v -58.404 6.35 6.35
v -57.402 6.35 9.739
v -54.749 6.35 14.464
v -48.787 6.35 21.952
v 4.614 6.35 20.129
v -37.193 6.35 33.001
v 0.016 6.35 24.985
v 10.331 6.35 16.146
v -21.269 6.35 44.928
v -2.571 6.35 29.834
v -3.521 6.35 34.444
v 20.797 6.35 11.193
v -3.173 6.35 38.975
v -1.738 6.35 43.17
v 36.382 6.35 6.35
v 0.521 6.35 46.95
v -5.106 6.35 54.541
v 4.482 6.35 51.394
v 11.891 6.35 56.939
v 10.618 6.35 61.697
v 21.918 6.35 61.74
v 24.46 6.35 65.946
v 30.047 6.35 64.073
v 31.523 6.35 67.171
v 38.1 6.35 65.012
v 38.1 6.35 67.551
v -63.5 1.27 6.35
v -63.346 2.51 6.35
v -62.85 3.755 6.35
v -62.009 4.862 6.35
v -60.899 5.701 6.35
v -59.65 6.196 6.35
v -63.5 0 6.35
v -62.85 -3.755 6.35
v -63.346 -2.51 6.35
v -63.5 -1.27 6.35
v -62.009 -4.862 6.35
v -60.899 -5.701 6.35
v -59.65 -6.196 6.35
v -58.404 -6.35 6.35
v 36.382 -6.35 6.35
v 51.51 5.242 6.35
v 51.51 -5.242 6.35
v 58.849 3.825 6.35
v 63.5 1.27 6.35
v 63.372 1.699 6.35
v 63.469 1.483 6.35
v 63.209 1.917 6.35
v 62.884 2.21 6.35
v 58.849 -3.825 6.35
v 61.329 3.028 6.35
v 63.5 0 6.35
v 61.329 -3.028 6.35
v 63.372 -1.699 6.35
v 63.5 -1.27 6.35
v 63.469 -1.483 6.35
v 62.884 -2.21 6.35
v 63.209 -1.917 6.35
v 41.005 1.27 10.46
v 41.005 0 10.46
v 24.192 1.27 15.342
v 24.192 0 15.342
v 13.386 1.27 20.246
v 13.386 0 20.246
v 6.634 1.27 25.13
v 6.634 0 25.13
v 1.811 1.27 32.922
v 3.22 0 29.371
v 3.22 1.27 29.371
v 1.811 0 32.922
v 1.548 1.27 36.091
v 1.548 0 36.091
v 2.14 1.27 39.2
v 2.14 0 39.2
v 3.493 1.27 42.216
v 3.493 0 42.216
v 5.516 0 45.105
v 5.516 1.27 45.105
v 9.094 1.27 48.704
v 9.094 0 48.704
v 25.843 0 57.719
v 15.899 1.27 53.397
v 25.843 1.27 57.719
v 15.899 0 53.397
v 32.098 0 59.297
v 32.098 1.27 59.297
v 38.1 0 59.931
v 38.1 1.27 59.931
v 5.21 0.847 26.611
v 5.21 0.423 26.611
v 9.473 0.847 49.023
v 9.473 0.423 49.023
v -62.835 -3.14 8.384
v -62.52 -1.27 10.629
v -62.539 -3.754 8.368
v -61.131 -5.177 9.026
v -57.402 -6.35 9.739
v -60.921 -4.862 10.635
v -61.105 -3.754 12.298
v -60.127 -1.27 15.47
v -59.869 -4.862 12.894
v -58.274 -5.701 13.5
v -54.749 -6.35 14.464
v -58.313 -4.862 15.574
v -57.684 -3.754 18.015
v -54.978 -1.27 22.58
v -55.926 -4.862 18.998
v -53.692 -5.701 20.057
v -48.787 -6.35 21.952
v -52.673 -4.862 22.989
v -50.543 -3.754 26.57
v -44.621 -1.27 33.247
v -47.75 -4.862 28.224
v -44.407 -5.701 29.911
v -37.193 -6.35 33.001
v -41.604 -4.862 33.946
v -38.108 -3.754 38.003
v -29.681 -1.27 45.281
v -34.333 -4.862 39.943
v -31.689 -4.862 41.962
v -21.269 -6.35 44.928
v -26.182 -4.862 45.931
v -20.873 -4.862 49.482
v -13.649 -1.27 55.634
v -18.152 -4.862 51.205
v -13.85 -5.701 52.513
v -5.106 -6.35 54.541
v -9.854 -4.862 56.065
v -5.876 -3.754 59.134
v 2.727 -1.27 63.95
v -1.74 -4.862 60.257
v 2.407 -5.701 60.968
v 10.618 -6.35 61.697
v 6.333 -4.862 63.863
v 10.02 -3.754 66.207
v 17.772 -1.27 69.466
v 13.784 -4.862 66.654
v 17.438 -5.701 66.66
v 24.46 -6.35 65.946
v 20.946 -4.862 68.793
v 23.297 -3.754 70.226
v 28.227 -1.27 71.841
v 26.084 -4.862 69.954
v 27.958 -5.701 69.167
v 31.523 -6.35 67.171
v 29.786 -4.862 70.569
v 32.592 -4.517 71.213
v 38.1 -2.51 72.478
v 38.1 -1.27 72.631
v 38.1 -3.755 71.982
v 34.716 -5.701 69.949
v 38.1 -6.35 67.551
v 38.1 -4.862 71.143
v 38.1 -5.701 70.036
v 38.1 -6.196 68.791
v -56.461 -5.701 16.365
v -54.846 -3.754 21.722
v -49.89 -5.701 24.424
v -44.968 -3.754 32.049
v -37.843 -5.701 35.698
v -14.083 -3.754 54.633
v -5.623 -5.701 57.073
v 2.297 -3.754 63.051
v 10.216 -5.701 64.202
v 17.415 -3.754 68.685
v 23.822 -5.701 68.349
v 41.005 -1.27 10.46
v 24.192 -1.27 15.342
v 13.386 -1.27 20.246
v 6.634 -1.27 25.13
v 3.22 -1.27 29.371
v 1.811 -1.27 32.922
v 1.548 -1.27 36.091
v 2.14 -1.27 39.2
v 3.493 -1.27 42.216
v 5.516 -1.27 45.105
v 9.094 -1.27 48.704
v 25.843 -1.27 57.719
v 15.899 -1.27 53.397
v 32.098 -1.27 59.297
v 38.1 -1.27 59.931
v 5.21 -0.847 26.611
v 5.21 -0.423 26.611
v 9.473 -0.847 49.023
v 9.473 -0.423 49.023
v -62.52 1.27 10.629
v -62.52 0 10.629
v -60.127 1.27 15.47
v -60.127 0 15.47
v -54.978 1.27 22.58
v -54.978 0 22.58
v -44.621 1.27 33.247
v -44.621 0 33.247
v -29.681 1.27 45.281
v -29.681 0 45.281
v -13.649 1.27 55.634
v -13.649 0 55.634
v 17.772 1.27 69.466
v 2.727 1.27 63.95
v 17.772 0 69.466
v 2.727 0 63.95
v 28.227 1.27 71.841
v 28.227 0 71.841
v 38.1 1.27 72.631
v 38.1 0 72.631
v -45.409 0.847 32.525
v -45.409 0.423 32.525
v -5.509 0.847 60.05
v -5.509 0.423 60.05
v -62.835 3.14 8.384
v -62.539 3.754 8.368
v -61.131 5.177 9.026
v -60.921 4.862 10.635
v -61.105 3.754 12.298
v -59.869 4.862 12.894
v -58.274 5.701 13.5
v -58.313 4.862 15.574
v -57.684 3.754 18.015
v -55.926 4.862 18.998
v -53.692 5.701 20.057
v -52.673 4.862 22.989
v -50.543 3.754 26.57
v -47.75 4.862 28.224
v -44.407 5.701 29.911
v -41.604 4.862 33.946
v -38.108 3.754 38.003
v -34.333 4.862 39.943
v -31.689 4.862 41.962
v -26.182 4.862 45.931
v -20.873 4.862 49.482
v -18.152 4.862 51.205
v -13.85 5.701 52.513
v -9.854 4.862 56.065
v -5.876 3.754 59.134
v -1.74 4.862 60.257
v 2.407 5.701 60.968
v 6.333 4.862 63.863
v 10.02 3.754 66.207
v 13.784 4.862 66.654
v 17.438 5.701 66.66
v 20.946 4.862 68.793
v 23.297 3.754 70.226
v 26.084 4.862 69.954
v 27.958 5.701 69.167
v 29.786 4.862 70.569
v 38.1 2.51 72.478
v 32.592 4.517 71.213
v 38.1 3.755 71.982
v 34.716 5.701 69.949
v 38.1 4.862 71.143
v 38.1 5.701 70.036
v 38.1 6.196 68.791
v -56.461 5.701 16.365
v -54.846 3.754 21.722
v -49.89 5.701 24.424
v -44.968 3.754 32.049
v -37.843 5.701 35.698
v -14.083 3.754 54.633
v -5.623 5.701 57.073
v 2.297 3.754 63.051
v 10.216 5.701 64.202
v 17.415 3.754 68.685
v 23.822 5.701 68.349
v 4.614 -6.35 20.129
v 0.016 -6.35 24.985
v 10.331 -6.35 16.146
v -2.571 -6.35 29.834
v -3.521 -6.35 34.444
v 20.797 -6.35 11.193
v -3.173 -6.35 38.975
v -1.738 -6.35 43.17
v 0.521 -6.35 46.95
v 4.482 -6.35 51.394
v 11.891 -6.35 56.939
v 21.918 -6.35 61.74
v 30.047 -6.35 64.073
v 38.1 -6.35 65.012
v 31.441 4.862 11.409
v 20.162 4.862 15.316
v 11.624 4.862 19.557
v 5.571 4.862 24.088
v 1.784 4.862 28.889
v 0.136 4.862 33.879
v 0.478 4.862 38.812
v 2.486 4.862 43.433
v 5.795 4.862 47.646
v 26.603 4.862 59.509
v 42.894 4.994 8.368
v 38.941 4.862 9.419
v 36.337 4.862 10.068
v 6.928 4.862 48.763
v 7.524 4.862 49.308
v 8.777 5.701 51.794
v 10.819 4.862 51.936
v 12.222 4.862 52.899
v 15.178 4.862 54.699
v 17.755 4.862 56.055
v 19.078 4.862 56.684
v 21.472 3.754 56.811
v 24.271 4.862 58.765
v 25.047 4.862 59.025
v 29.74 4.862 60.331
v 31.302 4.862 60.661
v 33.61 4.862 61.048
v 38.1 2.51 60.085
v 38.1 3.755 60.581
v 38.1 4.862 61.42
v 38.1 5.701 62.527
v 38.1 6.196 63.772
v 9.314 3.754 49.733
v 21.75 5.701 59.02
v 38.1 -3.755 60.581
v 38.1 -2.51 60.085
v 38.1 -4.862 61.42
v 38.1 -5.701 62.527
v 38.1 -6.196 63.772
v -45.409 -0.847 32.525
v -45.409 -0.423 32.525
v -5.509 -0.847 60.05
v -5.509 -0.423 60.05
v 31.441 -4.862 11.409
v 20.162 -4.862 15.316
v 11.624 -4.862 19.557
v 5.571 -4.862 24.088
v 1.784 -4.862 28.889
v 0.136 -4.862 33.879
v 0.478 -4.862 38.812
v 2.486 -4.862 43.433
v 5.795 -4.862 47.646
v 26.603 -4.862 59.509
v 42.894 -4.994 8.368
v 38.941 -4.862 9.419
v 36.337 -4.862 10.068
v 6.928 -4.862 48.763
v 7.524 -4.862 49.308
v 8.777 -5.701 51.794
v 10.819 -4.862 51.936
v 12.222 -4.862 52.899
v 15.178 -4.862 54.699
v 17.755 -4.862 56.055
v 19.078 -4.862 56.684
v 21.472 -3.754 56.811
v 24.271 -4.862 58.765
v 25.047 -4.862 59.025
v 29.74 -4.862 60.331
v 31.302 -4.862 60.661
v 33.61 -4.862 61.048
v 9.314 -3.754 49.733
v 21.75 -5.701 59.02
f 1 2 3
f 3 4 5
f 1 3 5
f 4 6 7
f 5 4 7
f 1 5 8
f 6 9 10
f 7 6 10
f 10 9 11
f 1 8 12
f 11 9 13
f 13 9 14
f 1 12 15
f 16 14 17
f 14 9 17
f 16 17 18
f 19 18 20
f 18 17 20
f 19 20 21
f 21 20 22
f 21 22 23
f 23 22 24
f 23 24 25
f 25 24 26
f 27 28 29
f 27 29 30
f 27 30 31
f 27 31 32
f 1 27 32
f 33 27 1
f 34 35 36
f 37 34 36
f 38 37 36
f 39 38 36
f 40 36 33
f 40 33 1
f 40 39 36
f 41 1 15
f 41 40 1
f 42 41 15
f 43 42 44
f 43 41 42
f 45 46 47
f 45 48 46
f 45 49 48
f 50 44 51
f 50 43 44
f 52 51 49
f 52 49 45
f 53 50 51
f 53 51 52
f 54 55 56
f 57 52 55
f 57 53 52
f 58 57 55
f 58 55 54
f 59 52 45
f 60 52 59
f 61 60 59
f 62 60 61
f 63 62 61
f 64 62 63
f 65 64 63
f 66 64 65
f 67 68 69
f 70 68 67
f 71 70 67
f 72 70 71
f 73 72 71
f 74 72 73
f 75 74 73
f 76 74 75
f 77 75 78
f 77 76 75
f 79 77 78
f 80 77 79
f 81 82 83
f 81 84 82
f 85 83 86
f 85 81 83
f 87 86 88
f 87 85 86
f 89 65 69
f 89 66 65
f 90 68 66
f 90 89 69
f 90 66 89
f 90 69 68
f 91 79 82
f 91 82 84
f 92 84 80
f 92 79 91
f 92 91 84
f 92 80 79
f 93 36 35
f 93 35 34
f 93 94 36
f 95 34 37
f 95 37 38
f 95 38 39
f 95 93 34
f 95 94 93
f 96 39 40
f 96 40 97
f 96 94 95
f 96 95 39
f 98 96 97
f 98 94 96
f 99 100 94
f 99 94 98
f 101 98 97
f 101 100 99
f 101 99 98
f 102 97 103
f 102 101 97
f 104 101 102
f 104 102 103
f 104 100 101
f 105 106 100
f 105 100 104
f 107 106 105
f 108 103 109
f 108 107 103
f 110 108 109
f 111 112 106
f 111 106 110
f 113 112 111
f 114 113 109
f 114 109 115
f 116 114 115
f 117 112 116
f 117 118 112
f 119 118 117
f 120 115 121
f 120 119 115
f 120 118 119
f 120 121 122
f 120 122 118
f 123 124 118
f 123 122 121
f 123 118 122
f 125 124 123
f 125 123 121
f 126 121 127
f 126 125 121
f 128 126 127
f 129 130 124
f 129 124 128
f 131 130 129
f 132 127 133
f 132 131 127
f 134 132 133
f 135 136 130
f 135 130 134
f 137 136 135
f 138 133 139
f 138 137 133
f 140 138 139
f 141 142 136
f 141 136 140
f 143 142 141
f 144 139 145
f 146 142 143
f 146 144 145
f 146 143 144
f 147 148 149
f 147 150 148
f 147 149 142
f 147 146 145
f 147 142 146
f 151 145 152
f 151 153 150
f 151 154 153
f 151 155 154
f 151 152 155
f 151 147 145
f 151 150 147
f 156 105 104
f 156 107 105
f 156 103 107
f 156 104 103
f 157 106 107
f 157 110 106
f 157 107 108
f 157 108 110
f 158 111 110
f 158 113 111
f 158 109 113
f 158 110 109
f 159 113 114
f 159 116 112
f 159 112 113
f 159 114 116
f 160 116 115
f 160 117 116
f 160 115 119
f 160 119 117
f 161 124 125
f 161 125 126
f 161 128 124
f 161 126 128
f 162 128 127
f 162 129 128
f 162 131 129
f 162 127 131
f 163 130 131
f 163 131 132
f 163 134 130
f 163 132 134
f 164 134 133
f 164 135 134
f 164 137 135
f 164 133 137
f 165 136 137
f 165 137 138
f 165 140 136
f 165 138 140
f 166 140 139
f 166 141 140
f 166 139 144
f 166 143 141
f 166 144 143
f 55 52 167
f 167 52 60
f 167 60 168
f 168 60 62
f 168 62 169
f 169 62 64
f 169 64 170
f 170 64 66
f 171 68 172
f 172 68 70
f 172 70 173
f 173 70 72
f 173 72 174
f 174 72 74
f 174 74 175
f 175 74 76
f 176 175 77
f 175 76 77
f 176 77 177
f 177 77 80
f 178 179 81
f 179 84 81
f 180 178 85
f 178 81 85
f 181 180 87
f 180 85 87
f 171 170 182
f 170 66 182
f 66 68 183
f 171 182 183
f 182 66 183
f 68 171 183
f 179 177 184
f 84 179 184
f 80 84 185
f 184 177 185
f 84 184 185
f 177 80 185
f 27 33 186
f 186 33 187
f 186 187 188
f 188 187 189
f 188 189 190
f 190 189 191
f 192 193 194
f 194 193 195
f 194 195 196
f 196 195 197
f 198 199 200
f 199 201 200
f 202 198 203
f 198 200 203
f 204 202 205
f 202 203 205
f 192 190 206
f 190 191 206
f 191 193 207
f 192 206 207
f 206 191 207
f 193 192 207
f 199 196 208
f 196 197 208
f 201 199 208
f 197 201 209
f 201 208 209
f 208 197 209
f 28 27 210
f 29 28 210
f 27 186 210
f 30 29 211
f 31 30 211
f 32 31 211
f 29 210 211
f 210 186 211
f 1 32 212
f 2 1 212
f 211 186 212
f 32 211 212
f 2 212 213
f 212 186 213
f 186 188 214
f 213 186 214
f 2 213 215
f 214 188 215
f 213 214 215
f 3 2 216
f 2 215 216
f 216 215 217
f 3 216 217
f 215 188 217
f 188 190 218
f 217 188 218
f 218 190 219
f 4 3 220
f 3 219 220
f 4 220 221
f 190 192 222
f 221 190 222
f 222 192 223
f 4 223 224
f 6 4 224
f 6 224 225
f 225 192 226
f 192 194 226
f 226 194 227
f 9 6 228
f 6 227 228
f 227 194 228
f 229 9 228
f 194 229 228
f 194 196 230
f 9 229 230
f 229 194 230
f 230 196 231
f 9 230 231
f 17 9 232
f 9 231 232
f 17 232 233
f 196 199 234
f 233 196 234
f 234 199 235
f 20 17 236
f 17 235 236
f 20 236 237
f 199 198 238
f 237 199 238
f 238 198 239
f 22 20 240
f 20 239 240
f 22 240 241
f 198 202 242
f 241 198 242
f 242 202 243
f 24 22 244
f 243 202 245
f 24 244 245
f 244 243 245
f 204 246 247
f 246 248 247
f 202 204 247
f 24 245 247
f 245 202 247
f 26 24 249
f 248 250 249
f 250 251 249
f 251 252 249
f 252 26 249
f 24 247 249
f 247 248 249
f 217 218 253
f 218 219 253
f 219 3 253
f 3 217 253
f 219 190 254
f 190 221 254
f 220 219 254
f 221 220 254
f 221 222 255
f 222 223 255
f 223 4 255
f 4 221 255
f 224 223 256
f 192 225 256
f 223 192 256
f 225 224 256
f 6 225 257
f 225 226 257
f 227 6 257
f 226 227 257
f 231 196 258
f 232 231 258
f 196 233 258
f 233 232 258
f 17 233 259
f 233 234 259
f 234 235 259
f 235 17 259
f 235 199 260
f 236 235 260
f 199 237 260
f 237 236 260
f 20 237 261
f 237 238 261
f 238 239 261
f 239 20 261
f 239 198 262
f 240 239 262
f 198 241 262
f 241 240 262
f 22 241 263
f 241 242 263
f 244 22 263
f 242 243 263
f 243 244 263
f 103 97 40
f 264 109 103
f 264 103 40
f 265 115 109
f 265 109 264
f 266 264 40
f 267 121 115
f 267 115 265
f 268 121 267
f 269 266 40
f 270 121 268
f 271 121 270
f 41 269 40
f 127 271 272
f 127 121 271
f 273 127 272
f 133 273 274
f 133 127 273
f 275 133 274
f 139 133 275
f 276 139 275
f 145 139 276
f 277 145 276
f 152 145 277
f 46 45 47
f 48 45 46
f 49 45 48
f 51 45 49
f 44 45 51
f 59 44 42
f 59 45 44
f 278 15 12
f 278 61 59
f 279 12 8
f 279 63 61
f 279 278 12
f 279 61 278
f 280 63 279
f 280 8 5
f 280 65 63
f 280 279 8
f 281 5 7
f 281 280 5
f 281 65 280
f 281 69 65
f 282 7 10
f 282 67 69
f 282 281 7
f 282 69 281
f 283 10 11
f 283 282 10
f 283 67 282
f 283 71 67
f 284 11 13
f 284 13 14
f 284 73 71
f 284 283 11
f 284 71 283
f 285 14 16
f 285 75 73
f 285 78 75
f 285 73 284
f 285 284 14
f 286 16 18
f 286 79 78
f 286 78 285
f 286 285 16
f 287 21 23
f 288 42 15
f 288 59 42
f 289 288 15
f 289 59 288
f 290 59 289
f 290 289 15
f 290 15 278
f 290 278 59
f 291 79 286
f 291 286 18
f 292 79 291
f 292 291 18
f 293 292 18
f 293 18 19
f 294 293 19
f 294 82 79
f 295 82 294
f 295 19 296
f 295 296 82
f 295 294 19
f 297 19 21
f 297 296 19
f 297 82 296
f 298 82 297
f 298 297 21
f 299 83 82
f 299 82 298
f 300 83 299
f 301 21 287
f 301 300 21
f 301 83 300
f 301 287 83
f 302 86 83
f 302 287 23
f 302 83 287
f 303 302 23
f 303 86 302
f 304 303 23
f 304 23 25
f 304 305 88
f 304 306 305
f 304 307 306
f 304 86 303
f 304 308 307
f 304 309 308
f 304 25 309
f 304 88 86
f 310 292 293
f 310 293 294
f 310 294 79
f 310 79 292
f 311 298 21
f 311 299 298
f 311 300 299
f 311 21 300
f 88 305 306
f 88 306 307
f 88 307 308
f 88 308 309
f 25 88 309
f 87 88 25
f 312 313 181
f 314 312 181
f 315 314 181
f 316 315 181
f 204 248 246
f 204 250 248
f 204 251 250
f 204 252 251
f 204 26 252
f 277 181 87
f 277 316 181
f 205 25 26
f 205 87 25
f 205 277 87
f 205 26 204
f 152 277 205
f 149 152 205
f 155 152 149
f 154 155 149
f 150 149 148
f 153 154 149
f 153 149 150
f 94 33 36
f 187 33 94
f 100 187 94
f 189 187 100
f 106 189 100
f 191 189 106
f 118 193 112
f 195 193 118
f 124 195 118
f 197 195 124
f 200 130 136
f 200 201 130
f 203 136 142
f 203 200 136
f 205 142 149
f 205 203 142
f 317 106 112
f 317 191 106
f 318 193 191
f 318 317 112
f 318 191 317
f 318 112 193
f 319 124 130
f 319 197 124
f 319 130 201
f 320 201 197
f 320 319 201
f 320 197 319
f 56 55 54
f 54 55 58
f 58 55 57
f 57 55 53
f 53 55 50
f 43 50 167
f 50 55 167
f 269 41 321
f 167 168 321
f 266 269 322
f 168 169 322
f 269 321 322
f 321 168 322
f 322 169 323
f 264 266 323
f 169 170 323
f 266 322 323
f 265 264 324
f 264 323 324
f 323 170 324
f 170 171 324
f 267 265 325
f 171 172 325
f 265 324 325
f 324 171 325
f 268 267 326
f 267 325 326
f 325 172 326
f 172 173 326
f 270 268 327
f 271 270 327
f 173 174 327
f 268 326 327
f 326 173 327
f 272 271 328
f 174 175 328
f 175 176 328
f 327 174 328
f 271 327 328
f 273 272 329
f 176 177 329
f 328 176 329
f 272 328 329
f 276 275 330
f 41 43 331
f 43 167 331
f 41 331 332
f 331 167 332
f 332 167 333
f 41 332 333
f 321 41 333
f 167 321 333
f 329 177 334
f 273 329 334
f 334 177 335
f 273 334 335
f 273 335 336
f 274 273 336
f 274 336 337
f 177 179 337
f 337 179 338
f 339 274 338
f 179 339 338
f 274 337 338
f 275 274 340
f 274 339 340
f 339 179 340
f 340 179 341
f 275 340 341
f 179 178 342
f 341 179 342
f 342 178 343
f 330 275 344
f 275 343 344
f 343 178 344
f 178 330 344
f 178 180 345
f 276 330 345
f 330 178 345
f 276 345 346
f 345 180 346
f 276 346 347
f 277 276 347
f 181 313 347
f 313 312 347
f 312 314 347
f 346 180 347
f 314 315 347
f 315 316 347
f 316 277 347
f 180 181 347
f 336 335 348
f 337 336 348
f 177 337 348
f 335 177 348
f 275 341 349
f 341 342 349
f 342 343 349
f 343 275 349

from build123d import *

# Parameters (mm, degrees)
F1_DEPTH = 6.35
F2_R     = 5.08


with BuildPart() as f1:
    # F0 (on Front) → F1 (new body, symmetric)
    with BuildSketch(Plane.XZ):
        with BuildLine():
            Line((-63.5, 6.35), (63.5, 6.35))
            add(Edge.make_bspline(
                [(63.5, 6.35), (-38.796838, 20.9835), (10.021353, 59.327461), (38.1, 59.931301)],
                knots=[0, 0, 0, 0, 59.296845, 59.296845, 59.296845, 59.296845], degree=3))
            Line((38.1, 59.931301), (38.1, 72.631301))
            add(Edge.make_bspline(
                [(-63.5, 6.35), (-62.346671, 26.418077), (-1.330229, 72.954319), (38.1, 72.631301)],
                knots=[0, 0, 0, 0, 121.308577, 121.308577, 121.308577, 121.308577], degree=3))
        make_face()
    extrude(amount=F1_DEPTH, both=True)

    # F2
    f2_edges = [f1.edges().sort_by_distance(p)[0] for p in [
        (-20.792679, -6.35, 51.301252),
        (-20.792679, 6.35, 51.301252),
        (7.139577, 6.35, 24.662786),
        (7.139577, -6.35, 24.662786),
    ]]
    fillet(f2_edges, radius=F2_R)


solid = f1.part
